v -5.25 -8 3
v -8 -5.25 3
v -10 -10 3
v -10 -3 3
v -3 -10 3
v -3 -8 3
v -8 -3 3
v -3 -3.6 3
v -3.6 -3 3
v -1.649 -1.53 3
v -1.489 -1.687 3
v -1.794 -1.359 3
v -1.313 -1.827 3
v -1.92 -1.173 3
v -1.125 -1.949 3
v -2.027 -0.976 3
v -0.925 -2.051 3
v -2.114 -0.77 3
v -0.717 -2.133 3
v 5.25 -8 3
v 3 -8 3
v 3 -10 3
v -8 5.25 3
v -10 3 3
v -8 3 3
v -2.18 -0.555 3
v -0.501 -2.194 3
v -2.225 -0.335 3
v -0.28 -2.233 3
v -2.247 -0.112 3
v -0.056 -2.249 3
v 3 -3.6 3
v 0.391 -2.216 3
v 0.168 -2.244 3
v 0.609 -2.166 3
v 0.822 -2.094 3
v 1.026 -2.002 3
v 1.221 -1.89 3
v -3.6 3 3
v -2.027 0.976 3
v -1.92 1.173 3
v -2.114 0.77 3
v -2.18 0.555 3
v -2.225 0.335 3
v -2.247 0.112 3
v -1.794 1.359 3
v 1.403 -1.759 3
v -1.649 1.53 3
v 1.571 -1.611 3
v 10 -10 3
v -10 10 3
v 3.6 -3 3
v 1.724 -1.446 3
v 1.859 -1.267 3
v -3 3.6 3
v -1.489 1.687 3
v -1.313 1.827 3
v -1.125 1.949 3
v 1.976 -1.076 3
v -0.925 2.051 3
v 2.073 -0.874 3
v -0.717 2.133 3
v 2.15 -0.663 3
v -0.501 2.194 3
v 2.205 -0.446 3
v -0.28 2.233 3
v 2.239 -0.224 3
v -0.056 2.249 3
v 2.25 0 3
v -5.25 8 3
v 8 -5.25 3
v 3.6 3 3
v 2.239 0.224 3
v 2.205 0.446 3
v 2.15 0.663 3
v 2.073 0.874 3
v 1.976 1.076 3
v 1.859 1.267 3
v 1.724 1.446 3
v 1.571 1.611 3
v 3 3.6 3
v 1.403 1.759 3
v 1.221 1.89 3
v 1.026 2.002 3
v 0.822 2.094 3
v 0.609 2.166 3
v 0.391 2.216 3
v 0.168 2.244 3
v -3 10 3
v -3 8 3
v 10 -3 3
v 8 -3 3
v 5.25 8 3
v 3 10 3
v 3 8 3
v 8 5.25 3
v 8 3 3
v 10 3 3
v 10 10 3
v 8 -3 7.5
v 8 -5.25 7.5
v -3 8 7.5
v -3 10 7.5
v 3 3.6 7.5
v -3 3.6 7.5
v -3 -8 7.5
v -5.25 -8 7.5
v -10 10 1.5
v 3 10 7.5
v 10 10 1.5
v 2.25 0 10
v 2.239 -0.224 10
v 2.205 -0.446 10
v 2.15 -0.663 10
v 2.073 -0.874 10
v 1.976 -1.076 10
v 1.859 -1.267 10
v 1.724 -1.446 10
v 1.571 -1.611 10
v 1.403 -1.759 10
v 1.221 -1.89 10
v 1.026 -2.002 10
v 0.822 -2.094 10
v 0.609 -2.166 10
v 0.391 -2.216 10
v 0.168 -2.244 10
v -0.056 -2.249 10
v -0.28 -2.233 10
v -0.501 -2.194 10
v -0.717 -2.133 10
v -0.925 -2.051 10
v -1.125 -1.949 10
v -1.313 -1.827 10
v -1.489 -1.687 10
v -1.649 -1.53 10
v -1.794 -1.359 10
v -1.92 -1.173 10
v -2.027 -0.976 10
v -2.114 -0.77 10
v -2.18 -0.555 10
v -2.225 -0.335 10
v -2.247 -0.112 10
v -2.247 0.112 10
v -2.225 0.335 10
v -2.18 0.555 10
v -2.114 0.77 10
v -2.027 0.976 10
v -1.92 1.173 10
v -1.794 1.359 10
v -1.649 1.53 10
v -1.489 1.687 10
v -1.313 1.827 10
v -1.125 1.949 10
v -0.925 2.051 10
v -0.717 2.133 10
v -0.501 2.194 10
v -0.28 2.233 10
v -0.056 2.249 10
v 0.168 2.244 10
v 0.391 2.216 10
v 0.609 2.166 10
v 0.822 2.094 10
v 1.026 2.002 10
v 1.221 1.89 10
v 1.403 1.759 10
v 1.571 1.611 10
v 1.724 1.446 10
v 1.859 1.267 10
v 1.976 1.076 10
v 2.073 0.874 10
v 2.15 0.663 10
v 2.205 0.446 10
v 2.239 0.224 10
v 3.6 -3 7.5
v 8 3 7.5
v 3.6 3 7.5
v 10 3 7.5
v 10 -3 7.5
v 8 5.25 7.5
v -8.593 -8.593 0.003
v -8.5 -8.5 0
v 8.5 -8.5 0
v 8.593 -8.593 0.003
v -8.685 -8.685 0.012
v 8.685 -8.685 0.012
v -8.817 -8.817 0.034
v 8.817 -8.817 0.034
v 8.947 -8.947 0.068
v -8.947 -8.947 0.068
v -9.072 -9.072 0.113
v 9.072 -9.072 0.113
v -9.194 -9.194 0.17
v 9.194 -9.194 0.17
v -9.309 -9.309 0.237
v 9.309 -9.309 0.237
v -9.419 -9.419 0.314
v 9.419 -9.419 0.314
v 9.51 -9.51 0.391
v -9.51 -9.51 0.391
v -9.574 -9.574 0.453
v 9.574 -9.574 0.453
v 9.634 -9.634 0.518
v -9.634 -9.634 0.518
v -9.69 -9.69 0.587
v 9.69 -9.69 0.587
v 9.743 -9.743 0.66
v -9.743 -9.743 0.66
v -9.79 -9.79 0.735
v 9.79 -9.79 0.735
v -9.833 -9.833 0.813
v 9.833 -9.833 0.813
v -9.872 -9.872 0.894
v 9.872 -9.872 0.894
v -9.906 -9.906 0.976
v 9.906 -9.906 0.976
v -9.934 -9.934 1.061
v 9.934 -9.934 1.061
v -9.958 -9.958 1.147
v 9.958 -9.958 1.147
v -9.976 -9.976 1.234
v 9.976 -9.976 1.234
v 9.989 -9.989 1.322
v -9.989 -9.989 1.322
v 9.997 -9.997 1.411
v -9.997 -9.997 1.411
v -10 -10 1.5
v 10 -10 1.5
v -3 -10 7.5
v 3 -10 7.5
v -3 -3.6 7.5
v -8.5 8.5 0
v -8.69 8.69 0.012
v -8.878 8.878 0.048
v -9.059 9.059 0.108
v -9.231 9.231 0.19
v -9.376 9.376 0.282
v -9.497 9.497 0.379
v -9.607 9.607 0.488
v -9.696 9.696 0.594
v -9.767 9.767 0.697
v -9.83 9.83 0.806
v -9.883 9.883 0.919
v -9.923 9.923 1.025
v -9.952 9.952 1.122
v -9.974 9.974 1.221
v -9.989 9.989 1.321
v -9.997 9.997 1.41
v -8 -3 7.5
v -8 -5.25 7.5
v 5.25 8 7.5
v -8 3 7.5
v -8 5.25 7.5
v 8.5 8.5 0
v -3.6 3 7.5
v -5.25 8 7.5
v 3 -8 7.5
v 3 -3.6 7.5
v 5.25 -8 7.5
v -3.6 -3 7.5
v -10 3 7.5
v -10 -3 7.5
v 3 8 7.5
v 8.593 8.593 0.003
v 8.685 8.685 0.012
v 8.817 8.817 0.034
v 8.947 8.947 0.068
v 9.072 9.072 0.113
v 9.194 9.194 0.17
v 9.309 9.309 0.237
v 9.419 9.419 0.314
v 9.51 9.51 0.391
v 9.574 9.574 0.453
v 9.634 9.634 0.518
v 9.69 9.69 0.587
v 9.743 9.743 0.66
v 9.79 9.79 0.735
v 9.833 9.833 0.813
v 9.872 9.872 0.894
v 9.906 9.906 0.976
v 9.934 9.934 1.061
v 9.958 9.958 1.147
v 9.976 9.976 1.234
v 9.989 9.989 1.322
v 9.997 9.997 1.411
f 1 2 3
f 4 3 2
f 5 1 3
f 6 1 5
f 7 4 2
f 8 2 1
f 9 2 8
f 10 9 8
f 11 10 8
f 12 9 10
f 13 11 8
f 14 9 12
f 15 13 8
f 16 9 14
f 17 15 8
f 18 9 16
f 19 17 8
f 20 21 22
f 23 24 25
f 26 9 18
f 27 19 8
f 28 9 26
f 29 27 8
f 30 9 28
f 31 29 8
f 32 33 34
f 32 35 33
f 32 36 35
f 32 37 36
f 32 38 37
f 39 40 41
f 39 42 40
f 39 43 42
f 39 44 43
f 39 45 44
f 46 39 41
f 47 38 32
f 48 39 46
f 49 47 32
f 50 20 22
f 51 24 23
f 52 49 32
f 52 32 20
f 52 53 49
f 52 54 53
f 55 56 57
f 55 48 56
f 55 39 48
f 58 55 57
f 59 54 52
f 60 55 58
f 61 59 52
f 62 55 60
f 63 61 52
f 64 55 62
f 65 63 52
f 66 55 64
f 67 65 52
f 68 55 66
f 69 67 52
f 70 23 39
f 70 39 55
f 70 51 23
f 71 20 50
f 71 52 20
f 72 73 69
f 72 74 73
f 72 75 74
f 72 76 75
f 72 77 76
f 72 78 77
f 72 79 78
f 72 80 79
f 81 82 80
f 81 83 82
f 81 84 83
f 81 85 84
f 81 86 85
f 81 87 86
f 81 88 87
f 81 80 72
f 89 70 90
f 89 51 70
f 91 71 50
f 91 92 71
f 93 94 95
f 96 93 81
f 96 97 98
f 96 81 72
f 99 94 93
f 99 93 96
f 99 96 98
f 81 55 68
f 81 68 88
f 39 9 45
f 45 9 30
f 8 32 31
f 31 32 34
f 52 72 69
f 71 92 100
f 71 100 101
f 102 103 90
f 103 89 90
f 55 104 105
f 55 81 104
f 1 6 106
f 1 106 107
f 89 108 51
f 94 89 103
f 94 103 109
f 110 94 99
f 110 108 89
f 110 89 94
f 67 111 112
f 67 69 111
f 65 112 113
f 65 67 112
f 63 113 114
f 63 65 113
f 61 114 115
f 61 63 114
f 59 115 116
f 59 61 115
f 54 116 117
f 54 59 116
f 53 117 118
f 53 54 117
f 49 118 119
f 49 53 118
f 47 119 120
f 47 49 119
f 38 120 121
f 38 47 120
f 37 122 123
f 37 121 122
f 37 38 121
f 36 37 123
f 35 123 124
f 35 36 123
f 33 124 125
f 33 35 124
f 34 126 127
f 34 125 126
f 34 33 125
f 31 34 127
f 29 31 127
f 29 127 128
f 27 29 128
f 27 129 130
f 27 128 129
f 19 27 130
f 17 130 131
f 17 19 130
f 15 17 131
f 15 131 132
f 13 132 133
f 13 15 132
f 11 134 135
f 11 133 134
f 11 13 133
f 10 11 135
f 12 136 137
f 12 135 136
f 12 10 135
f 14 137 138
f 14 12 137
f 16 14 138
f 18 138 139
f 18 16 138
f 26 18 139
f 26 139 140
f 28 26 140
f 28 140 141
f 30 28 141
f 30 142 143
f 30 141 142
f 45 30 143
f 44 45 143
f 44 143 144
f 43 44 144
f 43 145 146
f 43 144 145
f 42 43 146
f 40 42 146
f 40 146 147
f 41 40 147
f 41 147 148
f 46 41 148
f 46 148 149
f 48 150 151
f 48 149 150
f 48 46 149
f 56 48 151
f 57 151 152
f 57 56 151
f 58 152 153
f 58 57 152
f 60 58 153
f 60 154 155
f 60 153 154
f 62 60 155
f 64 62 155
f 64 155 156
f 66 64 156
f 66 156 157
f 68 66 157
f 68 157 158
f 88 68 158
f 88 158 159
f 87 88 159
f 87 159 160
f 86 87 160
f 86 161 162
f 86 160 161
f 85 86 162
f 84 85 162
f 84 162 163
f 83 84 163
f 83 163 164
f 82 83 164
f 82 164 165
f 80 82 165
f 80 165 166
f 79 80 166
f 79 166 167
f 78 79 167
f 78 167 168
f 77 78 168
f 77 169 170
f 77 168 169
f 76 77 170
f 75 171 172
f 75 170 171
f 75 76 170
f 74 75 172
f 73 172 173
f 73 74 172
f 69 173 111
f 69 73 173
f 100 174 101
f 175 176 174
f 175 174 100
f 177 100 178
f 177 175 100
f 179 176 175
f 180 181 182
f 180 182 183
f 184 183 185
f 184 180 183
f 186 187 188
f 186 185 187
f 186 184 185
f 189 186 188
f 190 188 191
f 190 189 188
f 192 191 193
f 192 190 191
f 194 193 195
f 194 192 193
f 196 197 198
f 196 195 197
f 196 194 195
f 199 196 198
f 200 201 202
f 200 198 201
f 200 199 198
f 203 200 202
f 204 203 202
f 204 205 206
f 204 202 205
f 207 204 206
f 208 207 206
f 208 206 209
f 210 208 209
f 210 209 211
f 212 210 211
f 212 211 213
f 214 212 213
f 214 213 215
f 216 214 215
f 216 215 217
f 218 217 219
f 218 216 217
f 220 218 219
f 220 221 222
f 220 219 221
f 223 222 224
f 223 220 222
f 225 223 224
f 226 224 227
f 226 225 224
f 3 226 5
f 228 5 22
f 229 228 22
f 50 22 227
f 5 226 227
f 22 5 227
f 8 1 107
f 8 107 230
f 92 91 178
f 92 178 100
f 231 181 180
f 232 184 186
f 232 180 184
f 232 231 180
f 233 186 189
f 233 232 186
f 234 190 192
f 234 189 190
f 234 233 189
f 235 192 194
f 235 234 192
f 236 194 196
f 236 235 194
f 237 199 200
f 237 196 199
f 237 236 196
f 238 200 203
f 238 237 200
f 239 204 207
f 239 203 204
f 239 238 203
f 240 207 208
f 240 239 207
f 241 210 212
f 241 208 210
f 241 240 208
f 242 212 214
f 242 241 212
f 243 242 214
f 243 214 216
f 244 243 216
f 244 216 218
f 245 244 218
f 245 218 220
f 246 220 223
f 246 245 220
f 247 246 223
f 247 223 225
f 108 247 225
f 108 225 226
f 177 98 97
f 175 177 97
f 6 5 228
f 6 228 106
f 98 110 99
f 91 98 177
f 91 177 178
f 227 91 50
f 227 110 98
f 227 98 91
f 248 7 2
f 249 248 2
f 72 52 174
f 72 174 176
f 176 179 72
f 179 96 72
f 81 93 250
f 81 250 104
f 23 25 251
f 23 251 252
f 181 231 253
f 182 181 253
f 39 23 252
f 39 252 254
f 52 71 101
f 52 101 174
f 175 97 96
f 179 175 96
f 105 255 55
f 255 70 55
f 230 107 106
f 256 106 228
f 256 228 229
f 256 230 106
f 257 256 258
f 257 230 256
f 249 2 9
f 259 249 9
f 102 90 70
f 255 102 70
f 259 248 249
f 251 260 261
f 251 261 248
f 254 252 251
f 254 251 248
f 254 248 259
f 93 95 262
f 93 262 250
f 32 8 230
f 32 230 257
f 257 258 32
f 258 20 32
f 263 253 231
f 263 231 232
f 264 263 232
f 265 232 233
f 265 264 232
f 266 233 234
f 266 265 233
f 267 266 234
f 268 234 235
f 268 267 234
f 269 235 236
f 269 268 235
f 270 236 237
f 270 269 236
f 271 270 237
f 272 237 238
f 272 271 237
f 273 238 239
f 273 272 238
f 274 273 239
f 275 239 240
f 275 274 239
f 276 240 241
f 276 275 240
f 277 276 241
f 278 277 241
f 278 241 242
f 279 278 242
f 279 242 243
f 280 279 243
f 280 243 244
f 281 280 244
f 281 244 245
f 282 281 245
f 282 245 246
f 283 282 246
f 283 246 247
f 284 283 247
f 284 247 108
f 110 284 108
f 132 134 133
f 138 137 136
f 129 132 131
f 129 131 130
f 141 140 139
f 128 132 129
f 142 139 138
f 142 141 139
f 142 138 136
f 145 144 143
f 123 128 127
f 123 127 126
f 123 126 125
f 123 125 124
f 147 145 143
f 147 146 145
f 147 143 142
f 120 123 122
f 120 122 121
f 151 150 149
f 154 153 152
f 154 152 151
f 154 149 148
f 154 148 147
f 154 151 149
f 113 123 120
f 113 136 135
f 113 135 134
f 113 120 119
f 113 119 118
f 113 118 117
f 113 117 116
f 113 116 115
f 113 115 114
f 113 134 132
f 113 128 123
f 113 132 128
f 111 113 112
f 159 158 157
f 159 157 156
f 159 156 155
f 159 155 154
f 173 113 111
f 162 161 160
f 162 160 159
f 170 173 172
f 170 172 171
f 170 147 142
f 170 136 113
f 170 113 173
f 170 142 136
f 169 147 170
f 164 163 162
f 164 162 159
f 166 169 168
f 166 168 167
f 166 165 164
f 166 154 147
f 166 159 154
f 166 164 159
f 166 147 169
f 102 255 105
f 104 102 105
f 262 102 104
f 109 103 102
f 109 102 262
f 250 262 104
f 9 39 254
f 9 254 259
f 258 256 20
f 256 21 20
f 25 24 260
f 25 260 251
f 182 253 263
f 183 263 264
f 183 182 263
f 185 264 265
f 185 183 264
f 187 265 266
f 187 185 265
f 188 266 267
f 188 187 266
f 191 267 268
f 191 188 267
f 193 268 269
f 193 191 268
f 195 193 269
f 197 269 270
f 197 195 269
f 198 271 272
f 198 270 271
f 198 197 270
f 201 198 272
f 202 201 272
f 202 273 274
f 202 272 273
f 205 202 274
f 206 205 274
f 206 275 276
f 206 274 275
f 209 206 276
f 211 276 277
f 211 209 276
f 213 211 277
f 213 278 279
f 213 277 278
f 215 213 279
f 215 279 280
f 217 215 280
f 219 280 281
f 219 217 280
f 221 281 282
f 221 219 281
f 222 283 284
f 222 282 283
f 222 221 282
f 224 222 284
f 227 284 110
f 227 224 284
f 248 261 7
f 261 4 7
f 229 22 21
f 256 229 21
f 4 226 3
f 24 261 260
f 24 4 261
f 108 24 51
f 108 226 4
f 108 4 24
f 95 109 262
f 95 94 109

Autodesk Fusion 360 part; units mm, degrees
sketch "Base" plane through (0, 0, 0) normal (0, 0, 1) x (1, 0, 0)
  line L0 (10, -10) -> (-10, -10)
  line L1 (-10, -10) -> (-10, 10)
  line L2 (-10, 10) -> (10, 10)
  line L3 (10, 10) -> (10, -10)
  line L4 (10, -10) -> (-10, 10) construction
  line L5 (-10, -10) -> (10, 10) construction
  circle A0 centre (0, 0) radius 2.25
  dimension "d1" = 20
  dimension "d2" = 20
  dimension "d3" = 4.5
extrude "Extrude1" add sketch "Base" along normal blind 3
extrude "Extrude2" add sketch "Base" along normal blind 10 contours A0
fillet "Fillet1" radius 1.5 4 edges at (10, 0, 0) (0, 10, 0) (-10, 0, 0) (0, -10, 0)
sketch "Inserts" plane through (0, 0, 0) normal (0, 0, 1) x (1, 0, 0)
  line L0 (-10, -10) -> (-3, -10)
  line L1 (-3, -10) -> (3, -10)
  line L2 (3, -10) -> (3, -8)
  line L3 (-3, -10) -> (-3, -8)
  line L4 (-3, -8) -> (-3, -3.6)
  line L5 (-3, -3.6) -> (3, -3.6)
  line L6 (3, -8) -> (5.25, -8)
  line L7 (-3, -8) -> (-5.25, -8)
  line L8 (-5.25, -8) -> (-3, -3.6)
  line L9 (5.25, -8) -> (3, -3.6)
  line L10 (-3, -8) -> (3, -8)
  line L11 (-10, 3) -> (-10, -3)
  line L12 (-8, 3) -> (-3.6, 3)
  line L13 (-8, -3) -> (-8, -5.25)
  line L14 (-3.6, 3) -> (-3.6, -3)
  line L15 (-8, 3) -> (-8, -3)
  line L16 (-8, 5.25) -> (-3.6, 3)
  line L17 (-10, 10) -> (-10, 3)
  line L18 (-8, 3) -> (-8, 5.25)
  line L19 (-8, -5.25) -> (-3.6, -3)
  line L20 (-10, 3) -> (-8, 3)
  line L21 (-10, -3) -> (-8, -3)
  line L22 (3, 10) -> (-3, 10)
  line L23 (3, 8) -> (3, 3.6)
  line L24 (-3, 8) -> (-5.25, 8)
  line L25 (3, 3.6) -> (-3, 3.6)
  line L26 (3, 8) -> (-3, 8)
  line L27 (5.25, 8) -> (3, 3.6)
  line L28 (10, 10) -> (3, 10)
  line L29 (3, 8) -> (5.25, 8)
  line L30 (-5.25, 8) -> (-3, 3.6)
  line L31 (3, 10) -> (3, 8)
  line L32 (-3, 10) -> (-3, 8)
  line L33 (10, -3) -> (10, 3)
  line L34 (8, -3) -> (3.6, -3)
  line L35 (8, 3) -> (8, 5.25)
  line L36 (3.6, -3) -> (3.6, 3)
  line L37 (8, -3) -> (8, 3)
  line L38 (8, -5.25) -> (3.6, -3)
  line L39 (10, -10) -> (10, -3)
  line L40 (8, -3) -> (8, -5.25)
  line L41 (8, 5.25) -> (3.6, 3)
  line L42 (10, -3) -> (8, -3)
  line L43 (10, 3) -> (8, 3)
  point P0 (-10, -10)
  point P1 (-10, 10)
  point P2 (10, 10)
  point P3 (10, -10)
  dimension "d10" = 7
  dimension "d11" = 6
  dimension "d12" = 2
  dimension "d13" = 2
  dimension "d14" = 4.4
  dimension "d15" = 6
  dimension "d16" = 2.25
  dimension "d17" = 2.25
  dimension "d27" = 7
  dimension "d28" = 6
  dimension "d29" = 2
  dimension "d30" = 2
  dimension "d31" = 4.4
  dimension "d32" = 6
  dimension "d33" = 2.25
  dimension "d34" = 2.25
  dimension "d35" = 7
  dimension "d36" = 6
  dimension "d37" = 2
  dimension "d38" = 2
  dimension "d39" = 4.4
  dimension "d40" = 6
  dimension "d41" = 2.25
  dimension "d42" = 2.25
  dimension "d43" = 7
  dimension "d44" = 6
  dimension "d45" = 2
  dimension "d46" = 2
  dimension "d47" = 4.4
  dimension "d48" = 6
  dimension "d49" = 2.25
  dimension "d50" = 2.25
extrude "Extrude4" add sketch "Inserts" along normal blind 3 from surface at 3 contours L1 L2 L3 L10 | L4 L7 L8 | L4 L5 L6 L9 L10
extrude "Extrude5" add sketch "Inserts" along normal blind 4.5 from surface at 3 contours L1 L2 L3 L10 | L4 L7 L8 | L4 L5 L6 L9 L10
extrude "Extrude6" add sketch "Inserts" along normal blind 3 from surface at 3 contours L11 L15 L20 L21 | L12 L16 L18 | L12 L13 L14 L15 L19 | L22 L26 L31 L32 | L23 L27 L29 | L23 L24 L25 L26 L30 | L33 L37 L42 L43 | L34 L38 L40 | L34 L35 L36 L37 L41
extrude "Extrude7" add sketch "Inserts" along normal blind 4.5 from surface at 3 contours L11 L15 L20 L21 | L12 L16 L18 | L12 L13 L14 L15 L19 | L22 L26 L31 L32 | L23 L27 L29 | L23 L24 L25 L26 L30 | L33 L37 L42 L43 | L34 L38 L40 | L34 L35 L36 L37 L41
